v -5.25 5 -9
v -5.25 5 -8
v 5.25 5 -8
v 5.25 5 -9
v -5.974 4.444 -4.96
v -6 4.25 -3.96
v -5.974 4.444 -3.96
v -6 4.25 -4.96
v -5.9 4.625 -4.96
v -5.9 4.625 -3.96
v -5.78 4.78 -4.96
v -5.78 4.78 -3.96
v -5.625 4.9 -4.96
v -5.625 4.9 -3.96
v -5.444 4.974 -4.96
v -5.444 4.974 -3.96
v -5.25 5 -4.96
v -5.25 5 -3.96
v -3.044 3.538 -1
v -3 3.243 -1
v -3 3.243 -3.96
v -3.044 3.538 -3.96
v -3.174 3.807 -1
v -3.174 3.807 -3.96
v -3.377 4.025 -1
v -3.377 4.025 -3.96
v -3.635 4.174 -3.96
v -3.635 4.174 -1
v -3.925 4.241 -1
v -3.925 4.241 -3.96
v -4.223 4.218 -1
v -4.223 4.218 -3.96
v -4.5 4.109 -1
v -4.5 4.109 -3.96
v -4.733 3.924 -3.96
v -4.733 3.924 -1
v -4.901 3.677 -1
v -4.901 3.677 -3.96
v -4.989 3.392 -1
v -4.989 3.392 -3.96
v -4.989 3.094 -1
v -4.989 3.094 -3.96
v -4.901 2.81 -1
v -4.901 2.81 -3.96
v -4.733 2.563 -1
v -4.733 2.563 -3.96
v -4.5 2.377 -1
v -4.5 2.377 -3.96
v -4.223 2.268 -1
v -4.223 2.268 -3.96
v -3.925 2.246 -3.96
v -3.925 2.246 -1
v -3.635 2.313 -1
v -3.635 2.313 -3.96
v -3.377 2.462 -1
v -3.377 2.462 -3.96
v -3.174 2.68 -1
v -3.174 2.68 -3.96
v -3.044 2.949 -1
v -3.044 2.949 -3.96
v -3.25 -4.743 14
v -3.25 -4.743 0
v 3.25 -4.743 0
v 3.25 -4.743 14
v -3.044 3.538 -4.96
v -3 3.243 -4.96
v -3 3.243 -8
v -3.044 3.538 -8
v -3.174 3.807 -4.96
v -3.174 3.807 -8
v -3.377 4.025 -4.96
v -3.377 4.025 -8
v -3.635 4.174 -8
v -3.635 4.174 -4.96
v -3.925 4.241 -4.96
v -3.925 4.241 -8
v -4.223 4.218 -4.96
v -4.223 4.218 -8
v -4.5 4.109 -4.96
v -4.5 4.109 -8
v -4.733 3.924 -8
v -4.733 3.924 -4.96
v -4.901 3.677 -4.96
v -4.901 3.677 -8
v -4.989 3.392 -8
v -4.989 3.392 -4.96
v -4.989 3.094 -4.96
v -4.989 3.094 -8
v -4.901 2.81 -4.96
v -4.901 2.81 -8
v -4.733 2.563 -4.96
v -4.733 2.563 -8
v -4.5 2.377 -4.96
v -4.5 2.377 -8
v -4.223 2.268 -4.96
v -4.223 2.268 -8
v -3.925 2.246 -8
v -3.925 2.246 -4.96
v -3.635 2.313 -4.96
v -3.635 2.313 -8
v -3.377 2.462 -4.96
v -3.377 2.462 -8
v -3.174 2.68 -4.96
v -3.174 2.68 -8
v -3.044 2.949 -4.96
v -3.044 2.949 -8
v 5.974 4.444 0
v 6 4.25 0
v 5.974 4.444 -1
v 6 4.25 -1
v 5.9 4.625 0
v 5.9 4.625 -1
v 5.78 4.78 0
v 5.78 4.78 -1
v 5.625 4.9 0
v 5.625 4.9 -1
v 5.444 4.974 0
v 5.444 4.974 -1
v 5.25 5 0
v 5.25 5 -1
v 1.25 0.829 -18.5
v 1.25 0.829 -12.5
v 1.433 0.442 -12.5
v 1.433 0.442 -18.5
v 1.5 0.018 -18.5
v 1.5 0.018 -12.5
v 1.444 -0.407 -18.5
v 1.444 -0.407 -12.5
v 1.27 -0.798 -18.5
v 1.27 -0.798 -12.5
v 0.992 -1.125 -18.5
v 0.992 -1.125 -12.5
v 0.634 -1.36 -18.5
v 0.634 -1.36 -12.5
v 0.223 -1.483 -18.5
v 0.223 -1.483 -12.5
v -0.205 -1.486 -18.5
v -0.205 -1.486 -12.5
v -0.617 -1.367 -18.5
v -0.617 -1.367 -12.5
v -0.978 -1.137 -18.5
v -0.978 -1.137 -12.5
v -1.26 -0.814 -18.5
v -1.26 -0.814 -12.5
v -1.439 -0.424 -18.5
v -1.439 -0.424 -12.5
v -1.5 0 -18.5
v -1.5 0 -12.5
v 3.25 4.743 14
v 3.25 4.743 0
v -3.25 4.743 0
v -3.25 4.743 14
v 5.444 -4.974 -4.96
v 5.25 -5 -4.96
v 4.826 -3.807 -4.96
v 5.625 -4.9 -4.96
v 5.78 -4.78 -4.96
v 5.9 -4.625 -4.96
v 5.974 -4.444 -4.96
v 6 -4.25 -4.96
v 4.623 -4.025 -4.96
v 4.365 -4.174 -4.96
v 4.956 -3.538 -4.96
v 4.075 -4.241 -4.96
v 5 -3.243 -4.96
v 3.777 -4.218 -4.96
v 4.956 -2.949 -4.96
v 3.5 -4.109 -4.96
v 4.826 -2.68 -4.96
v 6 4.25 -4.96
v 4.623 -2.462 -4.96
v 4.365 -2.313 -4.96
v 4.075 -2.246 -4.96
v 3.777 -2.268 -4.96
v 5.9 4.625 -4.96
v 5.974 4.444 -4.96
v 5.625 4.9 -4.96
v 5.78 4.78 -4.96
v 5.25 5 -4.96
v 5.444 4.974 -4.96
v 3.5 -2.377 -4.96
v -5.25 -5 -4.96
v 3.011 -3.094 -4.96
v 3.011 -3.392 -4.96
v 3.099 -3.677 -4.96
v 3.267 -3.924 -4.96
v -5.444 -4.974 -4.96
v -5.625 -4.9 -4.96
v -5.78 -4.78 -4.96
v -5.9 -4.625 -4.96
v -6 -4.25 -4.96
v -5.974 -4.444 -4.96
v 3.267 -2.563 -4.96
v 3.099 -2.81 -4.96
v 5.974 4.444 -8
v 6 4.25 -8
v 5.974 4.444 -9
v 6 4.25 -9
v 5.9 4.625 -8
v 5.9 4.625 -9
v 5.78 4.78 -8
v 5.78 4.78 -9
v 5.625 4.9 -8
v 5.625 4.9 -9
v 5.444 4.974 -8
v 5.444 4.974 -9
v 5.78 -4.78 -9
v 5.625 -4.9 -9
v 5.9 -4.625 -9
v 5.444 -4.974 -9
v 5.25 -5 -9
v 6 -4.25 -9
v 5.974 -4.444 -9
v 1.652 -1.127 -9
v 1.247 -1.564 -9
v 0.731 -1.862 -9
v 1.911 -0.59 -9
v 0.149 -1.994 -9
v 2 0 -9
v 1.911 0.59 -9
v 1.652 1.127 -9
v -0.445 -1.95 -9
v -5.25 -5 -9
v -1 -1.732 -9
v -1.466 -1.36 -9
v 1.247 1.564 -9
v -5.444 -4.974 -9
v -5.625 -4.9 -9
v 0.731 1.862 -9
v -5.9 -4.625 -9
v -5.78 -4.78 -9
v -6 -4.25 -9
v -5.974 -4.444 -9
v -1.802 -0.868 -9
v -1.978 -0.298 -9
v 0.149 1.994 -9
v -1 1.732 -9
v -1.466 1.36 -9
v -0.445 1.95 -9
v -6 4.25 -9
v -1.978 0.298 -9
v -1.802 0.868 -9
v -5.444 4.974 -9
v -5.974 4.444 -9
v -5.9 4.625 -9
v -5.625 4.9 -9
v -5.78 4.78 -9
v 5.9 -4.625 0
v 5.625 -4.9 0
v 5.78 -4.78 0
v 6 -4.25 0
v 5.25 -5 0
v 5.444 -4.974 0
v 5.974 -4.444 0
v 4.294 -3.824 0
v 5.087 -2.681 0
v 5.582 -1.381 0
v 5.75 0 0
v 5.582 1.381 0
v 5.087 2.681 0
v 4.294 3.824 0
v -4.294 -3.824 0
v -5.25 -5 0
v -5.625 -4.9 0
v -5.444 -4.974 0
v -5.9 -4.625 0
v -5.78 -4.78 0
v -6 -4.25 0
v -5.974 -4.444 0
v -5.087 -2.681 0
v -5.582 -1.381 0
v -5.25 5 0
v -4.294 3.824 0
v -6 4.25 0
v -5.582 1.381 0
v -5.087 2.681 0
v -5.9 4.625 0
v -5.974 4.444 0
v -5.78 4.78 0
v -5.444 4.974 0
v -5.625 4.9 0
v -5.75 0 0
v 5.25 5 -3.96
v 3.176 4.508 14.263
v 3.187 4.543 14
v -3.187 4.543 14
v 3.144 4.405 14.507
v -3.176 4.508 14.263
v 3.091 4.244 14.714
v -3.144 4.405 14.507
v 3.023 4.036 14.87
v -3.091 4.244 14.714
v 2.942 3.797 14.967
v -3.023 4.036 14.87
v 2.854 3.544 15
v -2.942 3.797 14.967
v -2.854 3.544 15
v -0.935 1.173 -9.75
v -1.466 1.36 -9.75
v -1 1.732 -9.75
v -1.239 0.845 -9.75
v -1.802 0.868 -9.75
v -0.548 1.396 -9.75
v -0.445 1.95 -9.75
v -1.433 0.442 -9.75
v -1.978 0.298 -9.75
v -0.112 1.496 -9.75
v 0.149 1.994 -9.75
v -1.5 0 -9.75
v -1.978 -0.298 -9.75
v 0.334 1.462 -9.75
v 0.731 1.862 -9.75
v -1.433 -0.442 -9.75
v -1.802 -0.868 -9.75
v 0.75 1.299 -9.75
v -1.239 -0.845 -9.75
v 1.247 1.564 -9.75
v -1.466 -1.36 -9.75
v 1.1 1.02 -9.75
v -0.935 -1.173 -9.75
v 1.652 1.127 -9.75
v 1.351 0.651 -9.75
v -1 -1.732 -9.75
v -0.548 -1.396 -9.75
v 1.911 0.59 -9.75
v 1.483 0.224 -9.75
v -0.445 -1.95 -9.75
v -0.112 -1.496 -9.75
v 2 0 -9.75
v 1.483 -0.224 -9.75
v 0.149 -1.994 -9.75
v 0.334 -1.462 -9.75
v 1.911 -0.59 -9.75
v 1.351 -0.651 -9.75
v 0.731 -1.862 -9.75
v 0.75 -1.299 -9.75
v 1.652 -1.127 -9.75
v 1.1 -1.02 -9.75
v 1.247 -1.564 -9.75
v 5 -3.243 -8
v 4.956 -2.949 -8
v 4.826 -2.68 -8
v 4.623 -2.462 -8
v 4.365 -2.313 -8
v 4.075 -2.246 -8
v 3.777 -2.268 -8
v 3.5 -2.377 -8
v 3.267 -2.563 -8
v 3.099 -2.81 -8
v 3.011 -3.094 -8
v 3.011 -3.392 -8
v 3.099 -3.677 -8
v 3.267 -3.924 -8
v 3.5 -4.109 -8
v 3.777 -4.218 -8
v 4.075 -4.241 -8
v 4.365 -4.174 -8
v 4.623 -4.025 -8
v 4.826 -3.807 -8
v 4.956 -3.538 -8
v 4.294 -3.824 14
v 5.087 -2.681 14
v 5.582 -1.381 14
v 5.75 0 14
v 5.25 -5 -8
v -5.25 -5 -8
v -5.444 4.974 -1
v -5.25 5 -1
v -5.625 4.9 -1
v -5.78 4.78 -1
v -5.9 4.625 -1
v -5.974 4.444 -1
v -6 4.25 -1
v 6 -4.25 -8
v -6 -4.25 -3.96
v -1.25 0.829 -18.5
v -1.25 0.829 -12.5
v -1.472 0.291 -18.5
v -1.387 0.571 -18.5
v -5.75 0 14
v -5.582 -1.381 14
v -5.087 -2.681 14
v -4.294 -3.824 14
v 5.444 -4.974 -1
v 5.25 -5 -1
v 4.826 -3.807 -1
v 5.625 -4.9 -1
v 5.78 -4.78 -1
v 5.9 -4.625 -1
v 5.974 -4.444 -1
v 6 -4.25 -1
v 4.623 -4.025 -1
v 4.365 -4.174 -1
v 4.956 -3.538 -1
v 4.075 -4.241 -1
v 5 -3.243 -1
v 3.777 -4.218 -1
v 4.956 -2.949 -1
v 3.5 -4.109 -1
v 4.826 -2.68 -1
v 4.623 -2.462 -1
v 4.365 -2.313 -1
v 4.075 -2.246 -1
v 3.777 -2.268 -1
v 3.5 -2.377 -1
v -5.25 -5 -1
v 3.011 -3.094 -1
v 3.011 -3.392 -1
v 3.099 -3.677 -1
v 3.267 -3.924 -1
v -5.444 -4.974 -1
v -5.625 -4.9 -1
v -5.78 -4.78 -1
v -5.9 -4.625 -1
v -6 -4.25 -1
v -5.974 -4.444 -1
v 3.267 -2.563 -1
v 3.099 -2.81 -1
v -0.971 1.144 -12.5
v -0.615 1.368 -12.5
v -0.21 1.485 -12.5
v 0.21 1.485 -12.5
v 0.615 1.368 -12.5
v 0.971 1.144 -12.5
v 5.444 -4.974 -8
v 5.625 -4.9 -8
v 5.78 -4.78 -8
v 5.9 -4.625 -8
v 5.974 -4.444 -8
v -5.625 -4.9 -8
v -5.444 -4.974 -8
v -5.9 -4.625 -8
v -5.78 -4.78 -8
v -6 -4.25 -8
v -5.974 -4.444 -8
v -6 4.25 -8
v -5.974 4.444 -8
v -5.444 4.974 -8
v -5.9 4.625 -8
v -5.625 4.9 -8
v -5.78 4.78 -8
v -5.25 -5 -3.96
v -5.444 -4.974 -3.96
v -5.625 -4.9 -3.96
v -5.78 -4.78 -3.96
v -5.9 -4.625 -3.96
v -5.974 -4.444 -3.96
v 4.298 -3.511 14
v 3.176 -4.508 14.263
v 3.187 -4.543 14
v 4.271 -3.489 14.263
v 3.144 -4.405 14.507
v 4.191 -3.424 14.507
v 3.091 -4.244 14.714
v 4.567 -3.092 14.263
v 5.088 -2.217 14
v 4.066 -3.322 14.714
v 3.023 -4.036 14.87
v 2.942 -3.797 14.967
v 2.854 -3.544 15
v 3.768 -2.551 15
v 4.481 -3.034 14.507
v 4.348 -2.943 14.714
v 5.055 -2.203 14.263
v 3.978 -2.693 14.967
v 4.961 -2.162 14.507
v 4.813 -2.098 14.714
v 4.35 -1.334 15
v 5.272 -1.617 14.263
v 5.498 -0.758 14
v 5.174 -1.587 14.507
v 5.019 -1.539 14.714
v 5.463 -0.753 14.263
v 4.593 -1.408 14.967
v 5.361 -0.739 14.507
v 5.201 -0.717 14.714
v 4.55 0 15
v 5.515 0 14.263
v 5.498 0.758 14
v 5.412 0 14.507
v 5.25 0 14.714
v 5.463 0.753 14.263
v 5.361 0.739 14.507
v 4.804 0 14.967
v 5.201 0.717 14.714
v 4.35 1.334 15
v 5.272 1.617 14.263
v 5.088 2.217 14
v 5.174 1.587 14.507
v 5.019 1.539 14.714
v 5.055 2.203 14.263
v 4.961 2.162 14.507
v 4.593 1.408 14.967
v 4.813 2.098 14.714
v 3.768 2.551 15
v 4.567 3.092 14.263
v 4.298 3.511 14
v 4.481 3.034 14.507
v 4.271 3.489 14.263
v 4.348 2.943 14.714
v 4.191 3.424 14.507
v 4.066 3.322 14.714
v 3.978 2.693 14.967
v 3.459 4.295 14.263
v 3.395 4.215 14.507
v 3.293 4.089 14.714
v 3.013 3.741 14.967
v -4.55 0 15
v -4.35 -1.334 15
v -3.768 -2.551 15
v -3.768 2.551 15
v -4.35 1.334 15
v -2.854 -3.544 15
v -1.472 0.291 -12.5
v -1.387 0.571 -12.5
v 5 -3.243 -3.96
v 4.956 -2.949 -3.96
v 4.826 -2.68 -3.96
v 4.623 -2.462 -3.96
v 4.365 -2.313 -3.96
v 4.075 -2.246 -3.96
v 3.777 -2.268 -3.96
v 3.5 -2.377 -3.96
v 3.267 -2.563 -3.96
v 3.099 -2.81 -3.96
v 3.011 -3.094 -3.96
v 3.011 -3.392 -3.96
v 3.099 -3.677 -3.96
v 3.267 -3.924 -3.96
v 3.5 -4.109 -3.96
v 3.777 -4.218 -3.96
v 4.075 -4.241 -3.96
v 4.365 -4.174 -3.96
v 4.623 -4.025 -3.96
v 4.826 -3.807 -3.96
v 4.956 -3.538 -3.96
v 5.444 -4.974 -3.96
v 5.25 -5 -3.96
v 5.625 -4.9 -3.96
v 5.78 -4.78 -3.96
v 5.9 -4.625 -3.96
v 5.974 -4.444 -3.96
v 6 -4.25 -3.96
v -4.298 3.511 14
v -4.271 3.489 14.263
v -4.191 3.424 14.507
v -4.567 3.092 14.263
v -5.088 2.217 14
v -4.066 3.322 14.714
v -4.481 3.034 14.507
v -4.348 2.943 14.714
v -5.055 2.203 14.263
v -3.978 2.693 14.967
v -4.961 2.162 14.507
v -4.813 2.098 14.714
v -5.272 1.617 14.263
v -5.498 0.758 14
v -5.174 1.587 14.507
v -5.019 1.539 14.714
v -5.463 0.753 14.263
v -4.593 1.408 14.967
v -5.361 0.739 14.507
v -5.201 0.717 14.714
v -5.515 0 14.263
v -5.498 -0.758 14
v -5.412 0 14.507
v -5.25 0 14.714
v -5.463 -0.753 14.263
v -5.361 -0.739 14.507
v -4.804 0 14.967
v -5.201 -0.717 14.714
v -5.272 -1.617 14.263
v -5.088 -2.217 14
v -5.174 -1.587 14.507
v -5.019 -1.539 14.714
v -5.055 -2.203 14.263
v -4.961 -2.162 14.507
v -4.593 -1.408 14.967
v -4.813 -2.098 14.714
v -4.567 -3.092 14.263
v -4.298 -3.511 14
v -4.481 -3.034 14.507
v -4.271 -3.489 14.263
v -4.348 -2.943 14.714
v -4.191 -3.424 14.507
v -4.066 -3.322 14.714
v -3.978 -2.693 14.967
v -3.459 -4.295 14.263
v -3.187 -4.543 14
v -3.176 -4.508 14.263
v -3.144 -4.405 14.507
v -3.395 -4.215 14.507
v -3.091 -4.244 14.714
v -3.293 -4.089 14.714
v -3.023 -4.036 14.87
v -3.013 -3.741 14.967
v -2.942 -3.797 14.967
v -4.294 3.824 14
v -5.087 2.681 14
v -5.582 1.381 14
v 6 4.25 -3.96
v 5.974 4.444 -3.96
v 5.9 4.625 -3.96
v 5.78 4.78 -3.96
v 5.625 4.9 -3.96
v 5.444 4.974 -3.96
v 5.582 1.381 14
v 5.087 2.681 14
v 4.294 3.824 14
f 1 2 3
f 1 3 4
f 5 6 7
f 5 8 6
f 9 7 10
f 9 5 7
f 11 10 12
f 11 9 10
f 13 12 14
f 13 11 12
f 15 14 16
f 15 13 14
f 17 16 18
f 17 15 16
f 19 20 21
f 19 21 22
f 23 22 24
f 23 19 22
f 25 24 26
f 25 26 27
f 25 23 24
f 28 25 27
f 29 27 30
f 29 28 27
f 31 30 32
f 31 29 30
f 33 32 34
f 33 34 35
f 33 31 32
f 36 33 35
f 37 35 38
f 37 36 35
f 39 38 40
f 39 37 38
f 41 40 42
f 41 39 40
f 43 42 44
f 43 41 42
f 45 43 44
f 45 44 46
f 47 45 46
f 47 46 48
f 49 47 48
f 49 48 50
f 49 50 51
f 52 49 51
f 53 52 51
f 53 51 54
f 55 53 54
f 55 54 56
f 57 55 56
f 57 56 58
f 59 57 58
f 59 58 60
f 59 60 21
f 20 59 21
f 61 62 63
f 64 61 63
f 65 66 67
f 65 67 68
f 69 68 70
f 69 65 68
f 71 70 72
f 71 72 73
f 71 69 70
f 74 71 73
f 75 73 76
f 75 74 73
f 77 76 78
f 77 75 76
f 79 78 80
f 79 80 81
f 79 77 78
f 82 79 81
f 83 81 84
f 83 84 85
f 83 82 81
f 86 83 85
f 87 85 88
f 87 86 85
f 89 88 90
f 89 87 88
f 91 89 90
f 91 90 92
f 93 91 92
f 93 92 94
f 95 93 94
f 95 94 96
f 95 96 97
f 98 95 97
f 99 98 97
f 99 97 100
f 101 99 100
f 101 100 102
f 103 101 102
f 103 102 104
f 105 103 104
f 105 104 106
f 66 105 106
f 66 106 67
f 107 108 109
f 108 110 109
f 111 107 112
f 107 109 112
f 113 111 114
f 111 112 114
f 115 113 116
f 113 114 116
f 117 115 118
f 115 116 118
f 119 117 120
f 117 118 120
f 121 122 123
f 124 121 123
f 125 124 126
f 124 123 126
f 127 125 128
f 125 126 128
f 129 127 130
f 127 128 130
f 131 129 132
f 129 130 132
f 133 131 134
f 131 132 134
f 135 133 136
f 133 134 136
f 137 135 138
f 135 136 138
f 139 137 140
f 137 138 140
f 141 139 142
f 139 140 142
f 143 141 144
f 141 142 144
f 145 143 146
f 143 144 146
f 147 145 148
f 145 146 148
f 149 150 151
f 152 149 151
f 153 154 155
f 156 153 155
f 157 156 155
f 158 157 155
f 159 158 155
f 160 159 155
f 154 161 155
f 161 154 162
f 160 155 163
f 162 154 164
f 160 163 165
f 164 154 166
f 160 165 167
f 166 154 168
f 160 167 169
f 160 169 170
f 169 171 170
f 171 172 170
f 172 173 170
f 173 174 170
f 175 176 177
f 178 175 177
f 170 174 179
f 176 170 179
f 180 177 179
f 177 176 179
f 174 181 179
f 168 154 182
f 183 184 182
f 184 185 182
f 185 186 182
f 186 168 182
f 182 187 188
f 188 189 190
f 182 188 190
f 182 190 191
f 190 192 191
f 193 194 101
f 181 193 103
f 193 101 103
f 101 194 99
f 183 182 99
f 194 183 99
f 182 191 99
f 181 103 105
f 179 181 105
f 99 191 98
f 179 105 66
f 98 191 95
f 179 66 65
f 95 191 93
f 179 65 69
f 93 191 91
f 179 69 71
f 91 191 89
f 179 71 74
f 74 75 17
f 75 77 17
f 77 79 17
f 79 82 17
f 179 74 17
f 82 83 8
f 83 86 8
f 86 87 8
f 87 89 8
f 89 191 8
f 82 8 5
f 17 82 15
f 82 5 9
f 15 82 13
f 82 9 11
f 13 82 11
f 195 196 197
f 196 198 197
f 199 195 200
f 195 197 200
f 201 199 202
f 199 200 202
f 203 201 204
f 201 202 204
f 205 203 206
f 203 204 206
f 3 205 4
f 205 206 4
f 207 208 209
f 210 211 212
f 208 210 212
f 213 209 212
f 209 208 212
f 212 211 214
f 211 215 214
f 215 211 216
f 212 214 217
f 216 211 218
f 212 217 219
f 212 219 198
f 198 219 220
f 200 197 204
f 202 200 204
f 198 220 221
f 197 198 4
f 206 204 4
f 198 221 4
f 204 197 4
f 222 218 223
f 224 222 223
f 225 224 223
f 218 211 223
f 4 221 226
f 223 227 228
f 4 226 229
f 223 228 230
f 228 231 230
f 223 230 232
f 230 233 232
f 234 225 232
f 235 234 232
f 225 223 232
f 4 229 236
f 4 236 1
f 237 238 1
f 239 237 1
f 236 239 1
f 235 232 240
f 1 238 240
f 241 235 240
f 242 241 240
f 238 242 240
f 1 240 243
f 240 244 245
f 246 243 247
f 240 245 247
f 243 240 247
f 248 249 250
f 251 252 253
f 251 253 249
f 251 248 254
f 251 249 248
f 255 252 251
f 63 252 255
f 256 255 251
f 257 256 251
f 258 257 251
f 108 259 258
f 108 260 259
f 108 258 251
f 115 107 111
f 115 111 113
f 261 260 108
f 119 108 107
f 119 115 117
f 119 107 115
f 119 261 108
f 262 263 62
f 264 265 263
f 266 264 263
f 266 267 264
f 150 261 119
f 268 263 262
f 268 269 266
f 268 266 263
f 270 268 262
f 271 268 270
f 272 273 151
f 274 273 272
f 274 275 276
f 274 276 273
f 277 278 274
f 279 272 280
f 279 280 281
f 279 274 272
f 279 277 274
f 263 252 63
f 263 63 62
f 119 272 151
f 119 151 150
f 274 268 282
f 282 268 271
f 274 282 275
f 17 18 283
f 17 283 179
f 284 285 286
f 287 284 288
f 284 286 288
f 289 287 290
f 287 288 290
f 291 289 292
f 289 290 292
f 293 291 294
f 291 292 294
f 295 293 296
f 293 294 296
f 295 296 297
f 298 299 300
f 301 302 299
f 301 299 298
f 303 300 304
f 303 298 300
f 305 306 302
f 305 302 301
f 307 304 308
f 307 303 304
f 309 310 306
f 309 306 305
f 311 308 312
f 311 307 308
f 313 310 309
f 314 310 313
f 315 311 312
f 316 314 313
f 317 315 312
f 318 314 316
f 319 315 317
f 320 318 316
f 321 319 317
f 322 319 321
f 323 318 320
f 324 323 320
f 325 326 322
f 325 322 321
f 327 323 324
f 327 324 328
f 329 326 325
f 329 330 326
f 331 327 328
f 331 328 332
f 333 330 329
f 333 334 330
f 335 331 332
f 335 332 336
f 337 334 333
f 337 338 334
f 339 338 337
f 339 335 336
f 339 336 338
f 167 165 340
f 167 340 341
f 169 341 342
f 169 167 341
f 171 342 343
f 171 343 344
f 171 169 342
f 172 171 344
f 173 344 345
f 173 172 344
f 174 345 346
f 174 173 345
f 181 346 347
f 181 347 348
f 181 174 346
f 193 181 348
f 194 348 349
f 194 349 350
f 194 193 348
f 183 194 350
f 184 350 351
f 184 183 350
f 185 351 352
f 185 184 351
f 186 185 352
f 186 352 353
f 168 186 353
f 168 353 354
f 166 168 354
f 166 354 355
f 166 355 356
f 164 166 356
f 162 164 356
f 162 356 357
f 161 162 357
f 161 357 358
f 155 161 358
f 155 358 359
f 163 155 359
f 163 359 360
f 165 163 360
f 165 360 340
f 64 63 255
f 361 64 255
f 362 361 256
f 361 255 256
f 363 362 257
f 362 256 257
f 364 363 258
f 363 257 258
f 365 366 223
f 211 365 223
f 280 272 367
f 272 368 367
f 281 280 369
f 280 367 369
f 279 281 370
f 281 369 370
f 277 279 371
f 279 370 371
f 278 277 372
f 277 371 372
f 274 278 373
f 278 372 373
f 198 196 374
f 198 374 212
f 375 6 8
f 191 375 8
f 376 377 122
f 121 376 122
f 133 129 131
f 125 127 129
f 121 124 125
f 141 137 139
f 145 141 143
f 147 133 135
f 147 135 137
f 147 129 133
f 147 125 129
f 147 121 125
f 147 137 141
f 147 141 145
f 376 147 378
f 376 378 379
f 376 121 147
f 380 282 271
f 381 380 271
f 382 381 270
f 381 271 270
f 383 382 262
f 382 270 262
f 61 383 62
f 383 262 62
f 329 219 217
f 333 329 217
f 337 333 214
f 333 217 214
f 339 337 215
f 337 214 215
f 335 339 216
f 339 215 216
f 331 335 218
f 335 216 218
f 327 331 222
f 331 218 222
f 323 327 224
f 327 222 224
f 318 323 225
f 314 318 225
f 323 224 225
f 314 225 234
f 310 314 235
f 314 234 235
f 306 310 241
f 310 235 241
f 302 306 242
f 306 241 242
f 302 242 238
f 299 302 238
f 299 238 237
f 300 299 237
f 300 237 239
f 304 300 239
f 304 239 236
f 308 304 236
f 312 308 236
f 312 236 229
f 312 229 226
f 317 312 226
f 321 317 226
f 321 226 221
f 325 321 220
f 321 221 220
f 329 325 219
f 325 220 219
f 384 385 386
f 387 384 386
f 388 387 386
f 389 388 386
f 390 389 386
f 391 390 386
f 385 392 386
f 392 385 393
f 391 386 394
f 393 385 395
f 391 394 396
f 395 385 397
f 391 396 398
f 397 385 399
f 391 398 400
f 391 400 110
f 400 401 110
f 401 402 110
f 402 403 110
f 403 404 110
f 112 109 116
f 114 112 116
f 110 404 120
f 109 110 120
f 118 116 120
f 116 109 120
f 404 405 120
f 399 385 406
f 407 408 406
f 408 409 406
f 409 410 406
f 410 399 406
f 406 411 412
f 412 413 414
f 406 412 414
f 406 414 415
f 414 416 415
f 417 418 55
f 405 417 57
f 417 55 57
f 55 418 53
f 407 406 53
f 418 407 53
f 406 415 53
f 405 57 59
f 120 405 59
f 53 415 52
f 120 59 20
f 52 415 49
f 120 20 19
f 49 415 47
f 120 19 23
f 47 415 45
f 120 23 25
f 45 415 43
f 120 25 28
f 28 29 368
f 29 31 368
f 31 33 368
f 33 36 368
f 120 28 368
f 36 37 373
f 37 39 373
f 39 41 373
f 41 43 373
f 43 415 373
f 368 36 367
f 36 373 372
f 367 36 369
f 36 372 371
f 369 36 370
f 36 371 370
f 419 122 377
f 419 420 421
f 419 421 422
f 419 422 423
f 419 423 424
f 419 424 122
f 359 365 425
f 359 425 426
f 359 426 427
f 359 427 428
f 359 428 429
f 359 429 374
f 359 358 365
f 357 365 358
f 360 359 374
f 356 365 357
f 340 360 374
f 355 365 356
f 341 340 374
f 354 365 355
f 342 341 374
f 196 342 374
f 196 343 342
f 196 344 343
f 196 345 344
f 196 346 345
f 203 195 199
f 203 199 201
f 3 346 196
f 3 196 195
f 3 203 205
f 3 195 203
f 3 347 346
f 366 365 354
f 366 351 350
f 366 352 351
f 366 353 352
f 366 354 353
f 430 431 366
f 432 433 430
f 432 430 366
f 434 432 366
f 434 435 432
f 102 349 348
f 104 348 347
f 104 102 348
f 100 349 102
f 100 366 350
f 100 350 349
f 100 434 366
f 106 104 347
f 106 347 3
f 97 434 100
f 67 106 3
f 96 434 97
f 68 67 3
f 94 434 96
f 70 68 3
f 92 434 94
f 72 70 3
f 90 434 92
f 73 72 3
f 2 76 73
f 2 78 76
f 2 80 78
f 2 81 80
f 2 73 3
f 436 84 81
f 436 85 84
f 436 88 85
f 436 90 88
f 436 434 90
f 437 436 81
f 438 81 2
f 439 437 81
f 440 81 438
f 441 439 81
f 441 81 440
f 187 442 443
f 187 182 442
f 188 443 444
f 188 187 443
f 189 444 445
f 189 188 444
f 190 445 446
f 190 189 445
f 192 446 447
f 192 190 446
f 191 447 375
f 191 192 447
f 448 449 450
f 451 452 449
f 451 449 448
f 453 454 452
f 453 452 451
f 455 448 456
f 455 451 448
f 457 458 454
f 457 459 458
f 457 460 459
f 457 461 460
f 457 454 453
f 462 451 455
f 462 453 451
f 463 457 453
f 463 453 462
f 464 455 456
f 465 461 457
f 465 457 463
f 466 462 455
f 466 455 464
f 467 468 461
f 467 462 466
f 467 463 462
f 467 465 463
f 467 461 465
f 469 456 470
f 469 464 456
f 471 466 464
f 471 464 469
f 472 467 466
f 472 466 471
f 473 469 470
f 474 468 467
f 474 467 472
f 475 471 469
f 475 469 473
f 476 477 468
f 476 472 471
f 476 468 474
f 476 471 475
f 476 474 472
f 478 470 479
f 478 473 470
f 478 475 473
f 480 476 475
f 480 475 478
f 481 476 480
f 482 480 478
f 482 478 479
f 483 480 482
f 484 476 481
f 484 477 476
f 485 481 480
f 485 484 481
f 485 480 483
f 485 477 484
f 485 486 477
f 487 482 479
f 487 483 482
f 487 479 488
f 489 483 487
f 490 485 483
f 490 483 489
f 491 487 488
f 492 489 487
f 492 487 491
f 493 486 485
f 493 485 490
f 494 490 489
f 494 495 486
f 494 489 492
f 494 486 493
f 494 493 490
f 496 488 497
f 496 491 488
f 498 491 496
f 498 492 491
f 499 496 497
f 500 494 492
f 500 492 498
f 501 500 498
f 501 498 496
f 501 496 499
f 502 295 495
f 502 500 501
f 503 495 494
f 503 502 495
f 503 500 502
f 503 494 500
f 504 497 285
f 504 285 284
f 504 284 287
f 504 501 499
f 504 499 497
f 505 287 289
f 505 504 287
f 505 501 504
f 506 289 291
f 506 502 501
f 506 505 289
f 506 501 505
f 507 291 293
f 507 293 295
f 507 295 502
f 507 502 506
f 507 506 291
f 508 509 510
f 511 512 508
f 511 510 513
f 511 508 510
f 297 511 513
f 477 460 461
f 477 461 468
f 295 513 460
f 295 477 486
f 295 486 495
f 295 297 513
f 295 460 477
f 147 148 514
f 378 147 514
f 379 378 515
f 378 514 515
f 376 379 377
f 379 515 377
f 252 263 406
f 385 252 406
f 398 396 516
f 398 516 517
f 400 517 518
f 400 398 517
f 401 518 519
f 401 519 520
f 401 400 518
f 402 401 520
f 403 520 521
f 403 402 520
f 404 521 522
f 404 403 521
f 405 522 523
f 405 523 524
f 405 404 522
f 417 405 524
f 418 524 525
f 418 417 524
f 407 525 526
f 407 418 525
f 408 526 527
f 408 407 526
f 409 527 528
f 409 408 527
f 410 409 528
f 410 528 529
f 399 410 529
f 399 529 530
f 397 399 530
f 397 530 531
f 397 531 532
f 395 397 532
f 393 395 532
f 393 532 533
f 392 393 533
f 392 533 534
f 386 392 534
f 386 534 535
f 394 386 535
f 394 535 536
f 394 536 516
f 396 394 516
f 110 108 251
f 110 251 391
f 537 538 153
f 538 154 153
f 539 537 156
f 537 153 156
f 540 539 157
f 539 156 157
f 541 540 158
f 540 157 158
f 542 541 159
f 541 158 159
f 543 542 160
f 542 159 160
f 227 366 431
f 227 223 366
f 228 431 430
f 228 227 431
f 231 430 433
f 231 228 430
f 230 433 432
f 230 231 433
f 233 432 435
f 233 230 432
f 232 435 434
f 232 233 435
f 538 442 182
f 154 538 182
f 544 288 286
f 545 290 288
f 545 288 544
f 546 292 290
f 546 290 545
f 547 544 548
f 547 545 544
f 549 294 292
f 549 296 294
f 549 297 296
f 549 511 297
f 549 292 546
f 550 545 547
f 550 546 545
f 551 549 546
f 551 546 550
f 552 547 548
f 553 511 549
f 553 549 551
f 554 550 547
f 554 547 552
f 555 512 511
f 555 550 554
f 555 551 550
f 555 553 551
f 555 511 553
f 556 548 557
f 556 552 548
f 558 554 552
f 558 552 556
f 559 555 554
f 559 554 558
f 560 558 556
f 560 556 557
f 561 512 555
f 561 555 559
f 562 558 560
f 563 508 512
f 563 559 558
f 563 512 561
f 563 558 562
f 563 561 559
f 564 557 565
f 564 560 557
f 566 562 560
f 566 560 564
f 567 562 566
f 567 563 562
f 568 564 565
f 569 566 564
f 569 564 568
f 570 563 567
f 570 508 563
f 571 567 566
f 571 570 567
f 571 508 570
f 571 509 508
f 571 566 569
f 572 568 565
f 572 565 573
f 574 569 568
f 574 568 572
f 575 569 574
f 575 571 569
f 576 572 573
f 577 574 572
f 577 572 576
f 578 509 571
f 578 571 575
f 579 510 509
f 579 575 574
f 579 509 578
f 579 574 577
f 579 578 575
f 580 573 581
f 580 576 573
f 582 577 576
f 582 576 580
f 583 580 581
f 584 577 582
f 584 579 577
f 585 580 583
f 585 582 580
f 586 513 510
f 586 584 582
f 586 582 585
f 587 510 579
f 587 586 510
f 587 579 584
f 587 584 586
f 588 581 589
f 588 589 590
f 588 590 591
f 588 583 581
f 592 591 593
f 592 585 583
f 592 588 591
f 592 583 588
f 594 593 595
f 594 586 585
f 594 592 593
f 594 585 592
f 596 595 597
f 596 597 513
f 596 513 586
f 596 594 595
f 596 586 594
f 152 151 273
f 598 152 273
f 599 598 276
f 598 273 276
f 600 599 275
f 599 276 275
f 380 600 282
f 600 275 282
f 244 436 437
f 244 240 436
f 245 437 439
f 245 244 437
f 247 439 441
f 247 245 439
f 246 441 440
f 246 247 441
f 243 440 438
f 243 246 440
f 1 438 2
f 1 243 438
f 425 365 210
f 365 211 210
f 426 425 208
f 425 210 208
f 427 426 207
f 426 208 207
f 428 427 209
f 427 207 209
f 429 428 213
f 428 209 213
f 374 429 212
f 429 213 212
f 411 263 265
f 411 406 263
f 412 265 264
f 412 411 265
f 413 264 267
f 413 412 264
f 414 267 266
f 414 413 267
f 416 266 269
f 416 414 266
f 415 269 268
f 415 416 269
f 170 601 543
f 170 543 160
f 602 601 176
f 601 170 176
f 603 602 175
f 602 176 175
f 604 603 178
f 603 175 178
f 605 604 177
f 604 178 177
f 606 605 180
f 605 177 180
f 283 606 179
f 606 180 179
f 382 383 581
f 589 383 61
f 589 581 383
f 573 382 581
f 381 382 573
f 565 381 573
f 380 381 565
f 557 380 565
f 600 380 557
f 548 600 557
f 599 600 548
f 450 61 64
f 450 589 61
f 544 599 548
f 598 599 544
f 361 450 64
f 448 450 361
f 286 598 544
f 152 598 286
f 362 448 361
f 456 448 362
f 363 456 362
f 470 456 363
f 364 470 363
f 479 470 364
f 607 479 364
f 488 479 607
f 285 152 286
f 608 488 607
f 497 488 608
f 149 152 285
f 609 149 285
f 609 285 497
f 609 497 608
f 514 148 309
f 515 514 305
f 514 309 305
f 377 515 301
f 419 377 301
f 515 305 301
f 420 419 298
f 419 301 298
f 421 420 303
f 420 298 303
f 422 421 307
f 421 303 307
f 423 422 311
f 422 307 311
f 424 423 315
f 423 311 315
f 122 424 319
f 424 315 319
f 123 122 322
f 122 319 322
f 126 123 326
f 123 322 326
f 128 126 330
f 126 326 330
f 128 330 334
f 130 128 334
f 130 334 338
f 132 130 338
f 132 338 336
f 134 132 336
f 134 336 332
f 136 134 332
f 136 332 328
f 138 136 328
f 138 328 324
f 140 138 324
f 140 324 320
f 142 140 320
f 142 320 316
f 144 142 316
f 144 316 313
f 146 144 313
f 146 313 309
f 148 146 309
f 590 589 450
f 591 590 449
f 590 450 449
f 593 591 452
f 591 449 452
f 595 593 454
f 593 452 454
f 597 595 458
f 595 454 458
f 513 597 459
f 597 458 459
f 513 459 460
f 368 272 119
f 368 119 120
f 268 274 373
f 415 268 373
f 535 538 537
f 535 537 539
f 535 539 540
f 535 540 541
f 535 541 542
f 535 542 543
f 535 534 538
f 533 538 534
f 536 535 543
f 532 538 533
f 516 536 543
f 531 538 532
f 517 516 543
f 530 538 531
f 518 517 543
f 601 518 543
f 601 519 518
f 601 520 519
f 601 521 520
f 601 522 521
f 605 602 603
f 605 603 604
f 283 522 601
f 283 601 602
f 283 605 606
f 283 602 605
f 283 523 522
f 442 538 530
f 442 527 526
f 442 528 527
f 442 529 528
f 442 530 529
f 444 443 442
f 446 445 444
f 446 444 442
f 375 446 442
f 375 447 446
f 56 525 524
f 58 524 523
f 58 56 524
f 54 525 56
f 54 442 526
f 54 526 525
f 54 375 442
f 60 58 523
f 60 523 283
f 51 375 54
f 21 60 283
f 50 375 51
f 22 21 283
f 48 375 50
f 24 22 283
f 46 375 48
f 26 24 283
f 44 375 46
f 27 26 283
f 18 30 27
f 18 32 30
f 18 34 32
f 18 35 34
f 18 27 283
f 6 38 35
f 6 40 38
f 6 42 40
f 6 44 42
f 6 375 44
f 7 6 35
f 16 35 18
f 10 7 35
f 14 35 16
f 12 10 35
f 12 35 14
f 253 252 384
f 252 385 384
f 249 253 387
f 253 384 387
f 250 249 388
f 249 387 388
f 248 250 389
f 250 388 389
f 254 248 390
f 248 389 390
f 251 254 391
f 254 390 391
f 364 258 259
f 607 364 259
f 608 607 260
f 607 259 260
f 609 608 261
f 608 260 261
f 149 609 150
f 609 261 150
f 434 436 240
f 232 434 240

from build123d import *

# Parameters (mm, degrees)
BOSS_EXTRUDE1_DEPTH      = 14
SKETCH2_R                = 1
BOSS_EXTRUDE2_DEPTH      = 9
BOSS_EXTRUDE3_DEPTH      = 6
BOSS_EXTRUDE3_DEPTH_BACK = 6
SKETCH3_W                = 1
SKETCH3_H                = 10
SKETCH4_R                = 2
SKETCH4_R_2              = 1.5
BOSS_EXTRUDE4_DEPTH      = 0.75
SKETCH5_R                = 1.5
BOSS_EXTRUDE5_DEPTH      = 3.5
BOSS_EXTRUDE6_DEPTH      = 6
BOSS_EXTRUDE7_DEPTH      = 1
FILLET1_R                = 1
FILLET2_R                = 0.75


with BuildPart() as part:
    # Sketch1 → Boss-Extrude1 (new body)
    with BuildSketch(Plane.XY):
        with BuildLine():
            Line((3.25, 4.74341649), (-3.25, 4.74341649))
            ThreePointArc((-3.25, 4.74341649), (-5.086747487, 2.680951324), (-5.75, 0))
            Line((-5.75, 0), (5.75, 0))
            ThreePointArc((5.75, 0), (5.086747487, 2.680951324), (3.25, 4.74341649))
        make_face()
        with BuildLine():
            Line((5.75, 0), (-5.75, 0))
            ThreePointArc((-5.75, 0), (-5.086747487, -2.680951324), (-3.25, -4.74341649))
            Line((-3.25, -4.74341649), (3.25, -4.74341649))
            ThreePointArc((3.25, -4.74341649), (5.086747487, -2.680951324), (5.75, 0))
        make_face()
    extrude(amount=BOSS_EXTRUDE1_DEPTH)

    # Sketch2 → Boss-Extrude2 (add)
    with BuildSketch(Plane.XY):
        with Locations((4, -3.24341649)):
            Circle(SKETCH2_R)
        with Locations((-4, 3.24341649)):
            Circle(SKETCH2_R)
    extrude(amount=-BOSS_EXTRUDE2_DEPTH)

    # Sketch3 → Boss-Extrude3 (add, two sides: drawn at the far end of the back side and taken through both)
    with BuildSketch(Plane(origin=(0, 0, 0), x_dir=(0, 0, -1), z_dir=(1, 0, 0)).offset(-BOSS_EXTRUDE3_DEPTH_BACK)):
        with Locations((0.5, 0)):
            Rectangle(SKETCH3_W, SKETCH3_H)
        with Locations((4.459742397, 0)):
            Rectangle(SKETCH3_W, SKETCH3_H)
        with Locations((8.5, 0)):
            Rectangle(SKETCH3_W, SKETCH3_H)
    extrude(amount=BOSS_EXTRUDE3_DEPTH + BOSS_EXTRUDE3_DEPTH_BACK)

    # Sketch4 → Boss-Extrude4 (add)
    with BuildSketch(Plane(origin=(0, 0, -9), x_dir=(-1, 0, 0), z_dir=(0, 0, -1))):
        with Locations(Location((0, 0, 0), (0, 0, 180))):
            Circle(SKETCH4_R)
        Circle(SKETCH4_R_2, mode=Mode.SUBTRACT)
    extrude(amount=BOSS_EXTRUDE4_DEPTH)

    # Sketch5 → Boss-Extrude5 (add)
    with BuildSketch(Plane(origin=(0, 0, -9), x_dir=(-1, 0, 0), z_dir=(0, 0, -1))):
        Circle(SKETCH5_R)
    extrude(amount=BOSS_EXTRUDE5_DEPTH)

    # Sketch6 → Boss-Extrude6 (add)
    with BuildSketch(Plane(origin=(0, 0, -12.5), x_dir=(-1, 0, 0), z_dir=(0, 0, -1))):
        with BuildLine():
            Line((1.25, 0.829156198), (-1.25, 0.829156198))
            ThreePointArc((-1.25, 0.829156198), (-0.433012702, -1.436140662), (1.5, 0))
            ThreePointArc((1.5, 0), (1.436140662, 0.433012702), (1.25, 0.829156198))
        make_face()
    extrude(amount=BOSS_EXTRUDE6_DEPTH)

    # Sketch7 → Boss-Extrude7 (add)
    with BuildSketch(Plane.XY.offset(14)):
        with BuildLine():
            Line((-3.187454564, -4.54341649), (3.187454564, -4.54341649))
            ThreePointArc((3.187454564, -4.54341649), (5.55, 0), (3.187454564, 4.54341649))
            Line((3.187454564, 4.54341649), (-3.187454564, 4.54341649))
            ThreePointArc((-3.187454564, 4.54341649), (-5.55, 0), (-3.187454564, -4.54341649))
        make_face()
    extrude(amount=BOSS_EXTRUDE7_DEPTH)

    # Fillet1
    fillet1_edges = [part.edges().sort_by_distance(p)[0] for p in [
        (0, 4.54341649, 15),
        (5.55, 0, 15),
        (0, -4.54341649, 15),
        (-5.55, 0, 15),
    ]]
    fillet(fillet1_edges, radius=FILLET1_R - 0.0001)  # a hair under: the kernel refuses the full size

    # Fillet2
    fillet2_edges = [part.edges().sort_by_distance(p)[0] for p in [
        (-6, 5, -0.5),
        (-6, -5, -0.5),
        (6, -5, -0.5),
        (6, 5, -0.5),
        (-6, 5, -4.459742397),
        (-6, -5, -4.459742397),
        (6, -5, -4.459742397),
        (6, 5, -4.459742397),
        (-6, -5, -8.5),
        (-6, 5, -8.5),
        (6, 5, -8.5),
        (6, -5, -8.5),
    ]]
    fillet(fillet2_edges, radius=FILLET2_R)


solid = part.part
